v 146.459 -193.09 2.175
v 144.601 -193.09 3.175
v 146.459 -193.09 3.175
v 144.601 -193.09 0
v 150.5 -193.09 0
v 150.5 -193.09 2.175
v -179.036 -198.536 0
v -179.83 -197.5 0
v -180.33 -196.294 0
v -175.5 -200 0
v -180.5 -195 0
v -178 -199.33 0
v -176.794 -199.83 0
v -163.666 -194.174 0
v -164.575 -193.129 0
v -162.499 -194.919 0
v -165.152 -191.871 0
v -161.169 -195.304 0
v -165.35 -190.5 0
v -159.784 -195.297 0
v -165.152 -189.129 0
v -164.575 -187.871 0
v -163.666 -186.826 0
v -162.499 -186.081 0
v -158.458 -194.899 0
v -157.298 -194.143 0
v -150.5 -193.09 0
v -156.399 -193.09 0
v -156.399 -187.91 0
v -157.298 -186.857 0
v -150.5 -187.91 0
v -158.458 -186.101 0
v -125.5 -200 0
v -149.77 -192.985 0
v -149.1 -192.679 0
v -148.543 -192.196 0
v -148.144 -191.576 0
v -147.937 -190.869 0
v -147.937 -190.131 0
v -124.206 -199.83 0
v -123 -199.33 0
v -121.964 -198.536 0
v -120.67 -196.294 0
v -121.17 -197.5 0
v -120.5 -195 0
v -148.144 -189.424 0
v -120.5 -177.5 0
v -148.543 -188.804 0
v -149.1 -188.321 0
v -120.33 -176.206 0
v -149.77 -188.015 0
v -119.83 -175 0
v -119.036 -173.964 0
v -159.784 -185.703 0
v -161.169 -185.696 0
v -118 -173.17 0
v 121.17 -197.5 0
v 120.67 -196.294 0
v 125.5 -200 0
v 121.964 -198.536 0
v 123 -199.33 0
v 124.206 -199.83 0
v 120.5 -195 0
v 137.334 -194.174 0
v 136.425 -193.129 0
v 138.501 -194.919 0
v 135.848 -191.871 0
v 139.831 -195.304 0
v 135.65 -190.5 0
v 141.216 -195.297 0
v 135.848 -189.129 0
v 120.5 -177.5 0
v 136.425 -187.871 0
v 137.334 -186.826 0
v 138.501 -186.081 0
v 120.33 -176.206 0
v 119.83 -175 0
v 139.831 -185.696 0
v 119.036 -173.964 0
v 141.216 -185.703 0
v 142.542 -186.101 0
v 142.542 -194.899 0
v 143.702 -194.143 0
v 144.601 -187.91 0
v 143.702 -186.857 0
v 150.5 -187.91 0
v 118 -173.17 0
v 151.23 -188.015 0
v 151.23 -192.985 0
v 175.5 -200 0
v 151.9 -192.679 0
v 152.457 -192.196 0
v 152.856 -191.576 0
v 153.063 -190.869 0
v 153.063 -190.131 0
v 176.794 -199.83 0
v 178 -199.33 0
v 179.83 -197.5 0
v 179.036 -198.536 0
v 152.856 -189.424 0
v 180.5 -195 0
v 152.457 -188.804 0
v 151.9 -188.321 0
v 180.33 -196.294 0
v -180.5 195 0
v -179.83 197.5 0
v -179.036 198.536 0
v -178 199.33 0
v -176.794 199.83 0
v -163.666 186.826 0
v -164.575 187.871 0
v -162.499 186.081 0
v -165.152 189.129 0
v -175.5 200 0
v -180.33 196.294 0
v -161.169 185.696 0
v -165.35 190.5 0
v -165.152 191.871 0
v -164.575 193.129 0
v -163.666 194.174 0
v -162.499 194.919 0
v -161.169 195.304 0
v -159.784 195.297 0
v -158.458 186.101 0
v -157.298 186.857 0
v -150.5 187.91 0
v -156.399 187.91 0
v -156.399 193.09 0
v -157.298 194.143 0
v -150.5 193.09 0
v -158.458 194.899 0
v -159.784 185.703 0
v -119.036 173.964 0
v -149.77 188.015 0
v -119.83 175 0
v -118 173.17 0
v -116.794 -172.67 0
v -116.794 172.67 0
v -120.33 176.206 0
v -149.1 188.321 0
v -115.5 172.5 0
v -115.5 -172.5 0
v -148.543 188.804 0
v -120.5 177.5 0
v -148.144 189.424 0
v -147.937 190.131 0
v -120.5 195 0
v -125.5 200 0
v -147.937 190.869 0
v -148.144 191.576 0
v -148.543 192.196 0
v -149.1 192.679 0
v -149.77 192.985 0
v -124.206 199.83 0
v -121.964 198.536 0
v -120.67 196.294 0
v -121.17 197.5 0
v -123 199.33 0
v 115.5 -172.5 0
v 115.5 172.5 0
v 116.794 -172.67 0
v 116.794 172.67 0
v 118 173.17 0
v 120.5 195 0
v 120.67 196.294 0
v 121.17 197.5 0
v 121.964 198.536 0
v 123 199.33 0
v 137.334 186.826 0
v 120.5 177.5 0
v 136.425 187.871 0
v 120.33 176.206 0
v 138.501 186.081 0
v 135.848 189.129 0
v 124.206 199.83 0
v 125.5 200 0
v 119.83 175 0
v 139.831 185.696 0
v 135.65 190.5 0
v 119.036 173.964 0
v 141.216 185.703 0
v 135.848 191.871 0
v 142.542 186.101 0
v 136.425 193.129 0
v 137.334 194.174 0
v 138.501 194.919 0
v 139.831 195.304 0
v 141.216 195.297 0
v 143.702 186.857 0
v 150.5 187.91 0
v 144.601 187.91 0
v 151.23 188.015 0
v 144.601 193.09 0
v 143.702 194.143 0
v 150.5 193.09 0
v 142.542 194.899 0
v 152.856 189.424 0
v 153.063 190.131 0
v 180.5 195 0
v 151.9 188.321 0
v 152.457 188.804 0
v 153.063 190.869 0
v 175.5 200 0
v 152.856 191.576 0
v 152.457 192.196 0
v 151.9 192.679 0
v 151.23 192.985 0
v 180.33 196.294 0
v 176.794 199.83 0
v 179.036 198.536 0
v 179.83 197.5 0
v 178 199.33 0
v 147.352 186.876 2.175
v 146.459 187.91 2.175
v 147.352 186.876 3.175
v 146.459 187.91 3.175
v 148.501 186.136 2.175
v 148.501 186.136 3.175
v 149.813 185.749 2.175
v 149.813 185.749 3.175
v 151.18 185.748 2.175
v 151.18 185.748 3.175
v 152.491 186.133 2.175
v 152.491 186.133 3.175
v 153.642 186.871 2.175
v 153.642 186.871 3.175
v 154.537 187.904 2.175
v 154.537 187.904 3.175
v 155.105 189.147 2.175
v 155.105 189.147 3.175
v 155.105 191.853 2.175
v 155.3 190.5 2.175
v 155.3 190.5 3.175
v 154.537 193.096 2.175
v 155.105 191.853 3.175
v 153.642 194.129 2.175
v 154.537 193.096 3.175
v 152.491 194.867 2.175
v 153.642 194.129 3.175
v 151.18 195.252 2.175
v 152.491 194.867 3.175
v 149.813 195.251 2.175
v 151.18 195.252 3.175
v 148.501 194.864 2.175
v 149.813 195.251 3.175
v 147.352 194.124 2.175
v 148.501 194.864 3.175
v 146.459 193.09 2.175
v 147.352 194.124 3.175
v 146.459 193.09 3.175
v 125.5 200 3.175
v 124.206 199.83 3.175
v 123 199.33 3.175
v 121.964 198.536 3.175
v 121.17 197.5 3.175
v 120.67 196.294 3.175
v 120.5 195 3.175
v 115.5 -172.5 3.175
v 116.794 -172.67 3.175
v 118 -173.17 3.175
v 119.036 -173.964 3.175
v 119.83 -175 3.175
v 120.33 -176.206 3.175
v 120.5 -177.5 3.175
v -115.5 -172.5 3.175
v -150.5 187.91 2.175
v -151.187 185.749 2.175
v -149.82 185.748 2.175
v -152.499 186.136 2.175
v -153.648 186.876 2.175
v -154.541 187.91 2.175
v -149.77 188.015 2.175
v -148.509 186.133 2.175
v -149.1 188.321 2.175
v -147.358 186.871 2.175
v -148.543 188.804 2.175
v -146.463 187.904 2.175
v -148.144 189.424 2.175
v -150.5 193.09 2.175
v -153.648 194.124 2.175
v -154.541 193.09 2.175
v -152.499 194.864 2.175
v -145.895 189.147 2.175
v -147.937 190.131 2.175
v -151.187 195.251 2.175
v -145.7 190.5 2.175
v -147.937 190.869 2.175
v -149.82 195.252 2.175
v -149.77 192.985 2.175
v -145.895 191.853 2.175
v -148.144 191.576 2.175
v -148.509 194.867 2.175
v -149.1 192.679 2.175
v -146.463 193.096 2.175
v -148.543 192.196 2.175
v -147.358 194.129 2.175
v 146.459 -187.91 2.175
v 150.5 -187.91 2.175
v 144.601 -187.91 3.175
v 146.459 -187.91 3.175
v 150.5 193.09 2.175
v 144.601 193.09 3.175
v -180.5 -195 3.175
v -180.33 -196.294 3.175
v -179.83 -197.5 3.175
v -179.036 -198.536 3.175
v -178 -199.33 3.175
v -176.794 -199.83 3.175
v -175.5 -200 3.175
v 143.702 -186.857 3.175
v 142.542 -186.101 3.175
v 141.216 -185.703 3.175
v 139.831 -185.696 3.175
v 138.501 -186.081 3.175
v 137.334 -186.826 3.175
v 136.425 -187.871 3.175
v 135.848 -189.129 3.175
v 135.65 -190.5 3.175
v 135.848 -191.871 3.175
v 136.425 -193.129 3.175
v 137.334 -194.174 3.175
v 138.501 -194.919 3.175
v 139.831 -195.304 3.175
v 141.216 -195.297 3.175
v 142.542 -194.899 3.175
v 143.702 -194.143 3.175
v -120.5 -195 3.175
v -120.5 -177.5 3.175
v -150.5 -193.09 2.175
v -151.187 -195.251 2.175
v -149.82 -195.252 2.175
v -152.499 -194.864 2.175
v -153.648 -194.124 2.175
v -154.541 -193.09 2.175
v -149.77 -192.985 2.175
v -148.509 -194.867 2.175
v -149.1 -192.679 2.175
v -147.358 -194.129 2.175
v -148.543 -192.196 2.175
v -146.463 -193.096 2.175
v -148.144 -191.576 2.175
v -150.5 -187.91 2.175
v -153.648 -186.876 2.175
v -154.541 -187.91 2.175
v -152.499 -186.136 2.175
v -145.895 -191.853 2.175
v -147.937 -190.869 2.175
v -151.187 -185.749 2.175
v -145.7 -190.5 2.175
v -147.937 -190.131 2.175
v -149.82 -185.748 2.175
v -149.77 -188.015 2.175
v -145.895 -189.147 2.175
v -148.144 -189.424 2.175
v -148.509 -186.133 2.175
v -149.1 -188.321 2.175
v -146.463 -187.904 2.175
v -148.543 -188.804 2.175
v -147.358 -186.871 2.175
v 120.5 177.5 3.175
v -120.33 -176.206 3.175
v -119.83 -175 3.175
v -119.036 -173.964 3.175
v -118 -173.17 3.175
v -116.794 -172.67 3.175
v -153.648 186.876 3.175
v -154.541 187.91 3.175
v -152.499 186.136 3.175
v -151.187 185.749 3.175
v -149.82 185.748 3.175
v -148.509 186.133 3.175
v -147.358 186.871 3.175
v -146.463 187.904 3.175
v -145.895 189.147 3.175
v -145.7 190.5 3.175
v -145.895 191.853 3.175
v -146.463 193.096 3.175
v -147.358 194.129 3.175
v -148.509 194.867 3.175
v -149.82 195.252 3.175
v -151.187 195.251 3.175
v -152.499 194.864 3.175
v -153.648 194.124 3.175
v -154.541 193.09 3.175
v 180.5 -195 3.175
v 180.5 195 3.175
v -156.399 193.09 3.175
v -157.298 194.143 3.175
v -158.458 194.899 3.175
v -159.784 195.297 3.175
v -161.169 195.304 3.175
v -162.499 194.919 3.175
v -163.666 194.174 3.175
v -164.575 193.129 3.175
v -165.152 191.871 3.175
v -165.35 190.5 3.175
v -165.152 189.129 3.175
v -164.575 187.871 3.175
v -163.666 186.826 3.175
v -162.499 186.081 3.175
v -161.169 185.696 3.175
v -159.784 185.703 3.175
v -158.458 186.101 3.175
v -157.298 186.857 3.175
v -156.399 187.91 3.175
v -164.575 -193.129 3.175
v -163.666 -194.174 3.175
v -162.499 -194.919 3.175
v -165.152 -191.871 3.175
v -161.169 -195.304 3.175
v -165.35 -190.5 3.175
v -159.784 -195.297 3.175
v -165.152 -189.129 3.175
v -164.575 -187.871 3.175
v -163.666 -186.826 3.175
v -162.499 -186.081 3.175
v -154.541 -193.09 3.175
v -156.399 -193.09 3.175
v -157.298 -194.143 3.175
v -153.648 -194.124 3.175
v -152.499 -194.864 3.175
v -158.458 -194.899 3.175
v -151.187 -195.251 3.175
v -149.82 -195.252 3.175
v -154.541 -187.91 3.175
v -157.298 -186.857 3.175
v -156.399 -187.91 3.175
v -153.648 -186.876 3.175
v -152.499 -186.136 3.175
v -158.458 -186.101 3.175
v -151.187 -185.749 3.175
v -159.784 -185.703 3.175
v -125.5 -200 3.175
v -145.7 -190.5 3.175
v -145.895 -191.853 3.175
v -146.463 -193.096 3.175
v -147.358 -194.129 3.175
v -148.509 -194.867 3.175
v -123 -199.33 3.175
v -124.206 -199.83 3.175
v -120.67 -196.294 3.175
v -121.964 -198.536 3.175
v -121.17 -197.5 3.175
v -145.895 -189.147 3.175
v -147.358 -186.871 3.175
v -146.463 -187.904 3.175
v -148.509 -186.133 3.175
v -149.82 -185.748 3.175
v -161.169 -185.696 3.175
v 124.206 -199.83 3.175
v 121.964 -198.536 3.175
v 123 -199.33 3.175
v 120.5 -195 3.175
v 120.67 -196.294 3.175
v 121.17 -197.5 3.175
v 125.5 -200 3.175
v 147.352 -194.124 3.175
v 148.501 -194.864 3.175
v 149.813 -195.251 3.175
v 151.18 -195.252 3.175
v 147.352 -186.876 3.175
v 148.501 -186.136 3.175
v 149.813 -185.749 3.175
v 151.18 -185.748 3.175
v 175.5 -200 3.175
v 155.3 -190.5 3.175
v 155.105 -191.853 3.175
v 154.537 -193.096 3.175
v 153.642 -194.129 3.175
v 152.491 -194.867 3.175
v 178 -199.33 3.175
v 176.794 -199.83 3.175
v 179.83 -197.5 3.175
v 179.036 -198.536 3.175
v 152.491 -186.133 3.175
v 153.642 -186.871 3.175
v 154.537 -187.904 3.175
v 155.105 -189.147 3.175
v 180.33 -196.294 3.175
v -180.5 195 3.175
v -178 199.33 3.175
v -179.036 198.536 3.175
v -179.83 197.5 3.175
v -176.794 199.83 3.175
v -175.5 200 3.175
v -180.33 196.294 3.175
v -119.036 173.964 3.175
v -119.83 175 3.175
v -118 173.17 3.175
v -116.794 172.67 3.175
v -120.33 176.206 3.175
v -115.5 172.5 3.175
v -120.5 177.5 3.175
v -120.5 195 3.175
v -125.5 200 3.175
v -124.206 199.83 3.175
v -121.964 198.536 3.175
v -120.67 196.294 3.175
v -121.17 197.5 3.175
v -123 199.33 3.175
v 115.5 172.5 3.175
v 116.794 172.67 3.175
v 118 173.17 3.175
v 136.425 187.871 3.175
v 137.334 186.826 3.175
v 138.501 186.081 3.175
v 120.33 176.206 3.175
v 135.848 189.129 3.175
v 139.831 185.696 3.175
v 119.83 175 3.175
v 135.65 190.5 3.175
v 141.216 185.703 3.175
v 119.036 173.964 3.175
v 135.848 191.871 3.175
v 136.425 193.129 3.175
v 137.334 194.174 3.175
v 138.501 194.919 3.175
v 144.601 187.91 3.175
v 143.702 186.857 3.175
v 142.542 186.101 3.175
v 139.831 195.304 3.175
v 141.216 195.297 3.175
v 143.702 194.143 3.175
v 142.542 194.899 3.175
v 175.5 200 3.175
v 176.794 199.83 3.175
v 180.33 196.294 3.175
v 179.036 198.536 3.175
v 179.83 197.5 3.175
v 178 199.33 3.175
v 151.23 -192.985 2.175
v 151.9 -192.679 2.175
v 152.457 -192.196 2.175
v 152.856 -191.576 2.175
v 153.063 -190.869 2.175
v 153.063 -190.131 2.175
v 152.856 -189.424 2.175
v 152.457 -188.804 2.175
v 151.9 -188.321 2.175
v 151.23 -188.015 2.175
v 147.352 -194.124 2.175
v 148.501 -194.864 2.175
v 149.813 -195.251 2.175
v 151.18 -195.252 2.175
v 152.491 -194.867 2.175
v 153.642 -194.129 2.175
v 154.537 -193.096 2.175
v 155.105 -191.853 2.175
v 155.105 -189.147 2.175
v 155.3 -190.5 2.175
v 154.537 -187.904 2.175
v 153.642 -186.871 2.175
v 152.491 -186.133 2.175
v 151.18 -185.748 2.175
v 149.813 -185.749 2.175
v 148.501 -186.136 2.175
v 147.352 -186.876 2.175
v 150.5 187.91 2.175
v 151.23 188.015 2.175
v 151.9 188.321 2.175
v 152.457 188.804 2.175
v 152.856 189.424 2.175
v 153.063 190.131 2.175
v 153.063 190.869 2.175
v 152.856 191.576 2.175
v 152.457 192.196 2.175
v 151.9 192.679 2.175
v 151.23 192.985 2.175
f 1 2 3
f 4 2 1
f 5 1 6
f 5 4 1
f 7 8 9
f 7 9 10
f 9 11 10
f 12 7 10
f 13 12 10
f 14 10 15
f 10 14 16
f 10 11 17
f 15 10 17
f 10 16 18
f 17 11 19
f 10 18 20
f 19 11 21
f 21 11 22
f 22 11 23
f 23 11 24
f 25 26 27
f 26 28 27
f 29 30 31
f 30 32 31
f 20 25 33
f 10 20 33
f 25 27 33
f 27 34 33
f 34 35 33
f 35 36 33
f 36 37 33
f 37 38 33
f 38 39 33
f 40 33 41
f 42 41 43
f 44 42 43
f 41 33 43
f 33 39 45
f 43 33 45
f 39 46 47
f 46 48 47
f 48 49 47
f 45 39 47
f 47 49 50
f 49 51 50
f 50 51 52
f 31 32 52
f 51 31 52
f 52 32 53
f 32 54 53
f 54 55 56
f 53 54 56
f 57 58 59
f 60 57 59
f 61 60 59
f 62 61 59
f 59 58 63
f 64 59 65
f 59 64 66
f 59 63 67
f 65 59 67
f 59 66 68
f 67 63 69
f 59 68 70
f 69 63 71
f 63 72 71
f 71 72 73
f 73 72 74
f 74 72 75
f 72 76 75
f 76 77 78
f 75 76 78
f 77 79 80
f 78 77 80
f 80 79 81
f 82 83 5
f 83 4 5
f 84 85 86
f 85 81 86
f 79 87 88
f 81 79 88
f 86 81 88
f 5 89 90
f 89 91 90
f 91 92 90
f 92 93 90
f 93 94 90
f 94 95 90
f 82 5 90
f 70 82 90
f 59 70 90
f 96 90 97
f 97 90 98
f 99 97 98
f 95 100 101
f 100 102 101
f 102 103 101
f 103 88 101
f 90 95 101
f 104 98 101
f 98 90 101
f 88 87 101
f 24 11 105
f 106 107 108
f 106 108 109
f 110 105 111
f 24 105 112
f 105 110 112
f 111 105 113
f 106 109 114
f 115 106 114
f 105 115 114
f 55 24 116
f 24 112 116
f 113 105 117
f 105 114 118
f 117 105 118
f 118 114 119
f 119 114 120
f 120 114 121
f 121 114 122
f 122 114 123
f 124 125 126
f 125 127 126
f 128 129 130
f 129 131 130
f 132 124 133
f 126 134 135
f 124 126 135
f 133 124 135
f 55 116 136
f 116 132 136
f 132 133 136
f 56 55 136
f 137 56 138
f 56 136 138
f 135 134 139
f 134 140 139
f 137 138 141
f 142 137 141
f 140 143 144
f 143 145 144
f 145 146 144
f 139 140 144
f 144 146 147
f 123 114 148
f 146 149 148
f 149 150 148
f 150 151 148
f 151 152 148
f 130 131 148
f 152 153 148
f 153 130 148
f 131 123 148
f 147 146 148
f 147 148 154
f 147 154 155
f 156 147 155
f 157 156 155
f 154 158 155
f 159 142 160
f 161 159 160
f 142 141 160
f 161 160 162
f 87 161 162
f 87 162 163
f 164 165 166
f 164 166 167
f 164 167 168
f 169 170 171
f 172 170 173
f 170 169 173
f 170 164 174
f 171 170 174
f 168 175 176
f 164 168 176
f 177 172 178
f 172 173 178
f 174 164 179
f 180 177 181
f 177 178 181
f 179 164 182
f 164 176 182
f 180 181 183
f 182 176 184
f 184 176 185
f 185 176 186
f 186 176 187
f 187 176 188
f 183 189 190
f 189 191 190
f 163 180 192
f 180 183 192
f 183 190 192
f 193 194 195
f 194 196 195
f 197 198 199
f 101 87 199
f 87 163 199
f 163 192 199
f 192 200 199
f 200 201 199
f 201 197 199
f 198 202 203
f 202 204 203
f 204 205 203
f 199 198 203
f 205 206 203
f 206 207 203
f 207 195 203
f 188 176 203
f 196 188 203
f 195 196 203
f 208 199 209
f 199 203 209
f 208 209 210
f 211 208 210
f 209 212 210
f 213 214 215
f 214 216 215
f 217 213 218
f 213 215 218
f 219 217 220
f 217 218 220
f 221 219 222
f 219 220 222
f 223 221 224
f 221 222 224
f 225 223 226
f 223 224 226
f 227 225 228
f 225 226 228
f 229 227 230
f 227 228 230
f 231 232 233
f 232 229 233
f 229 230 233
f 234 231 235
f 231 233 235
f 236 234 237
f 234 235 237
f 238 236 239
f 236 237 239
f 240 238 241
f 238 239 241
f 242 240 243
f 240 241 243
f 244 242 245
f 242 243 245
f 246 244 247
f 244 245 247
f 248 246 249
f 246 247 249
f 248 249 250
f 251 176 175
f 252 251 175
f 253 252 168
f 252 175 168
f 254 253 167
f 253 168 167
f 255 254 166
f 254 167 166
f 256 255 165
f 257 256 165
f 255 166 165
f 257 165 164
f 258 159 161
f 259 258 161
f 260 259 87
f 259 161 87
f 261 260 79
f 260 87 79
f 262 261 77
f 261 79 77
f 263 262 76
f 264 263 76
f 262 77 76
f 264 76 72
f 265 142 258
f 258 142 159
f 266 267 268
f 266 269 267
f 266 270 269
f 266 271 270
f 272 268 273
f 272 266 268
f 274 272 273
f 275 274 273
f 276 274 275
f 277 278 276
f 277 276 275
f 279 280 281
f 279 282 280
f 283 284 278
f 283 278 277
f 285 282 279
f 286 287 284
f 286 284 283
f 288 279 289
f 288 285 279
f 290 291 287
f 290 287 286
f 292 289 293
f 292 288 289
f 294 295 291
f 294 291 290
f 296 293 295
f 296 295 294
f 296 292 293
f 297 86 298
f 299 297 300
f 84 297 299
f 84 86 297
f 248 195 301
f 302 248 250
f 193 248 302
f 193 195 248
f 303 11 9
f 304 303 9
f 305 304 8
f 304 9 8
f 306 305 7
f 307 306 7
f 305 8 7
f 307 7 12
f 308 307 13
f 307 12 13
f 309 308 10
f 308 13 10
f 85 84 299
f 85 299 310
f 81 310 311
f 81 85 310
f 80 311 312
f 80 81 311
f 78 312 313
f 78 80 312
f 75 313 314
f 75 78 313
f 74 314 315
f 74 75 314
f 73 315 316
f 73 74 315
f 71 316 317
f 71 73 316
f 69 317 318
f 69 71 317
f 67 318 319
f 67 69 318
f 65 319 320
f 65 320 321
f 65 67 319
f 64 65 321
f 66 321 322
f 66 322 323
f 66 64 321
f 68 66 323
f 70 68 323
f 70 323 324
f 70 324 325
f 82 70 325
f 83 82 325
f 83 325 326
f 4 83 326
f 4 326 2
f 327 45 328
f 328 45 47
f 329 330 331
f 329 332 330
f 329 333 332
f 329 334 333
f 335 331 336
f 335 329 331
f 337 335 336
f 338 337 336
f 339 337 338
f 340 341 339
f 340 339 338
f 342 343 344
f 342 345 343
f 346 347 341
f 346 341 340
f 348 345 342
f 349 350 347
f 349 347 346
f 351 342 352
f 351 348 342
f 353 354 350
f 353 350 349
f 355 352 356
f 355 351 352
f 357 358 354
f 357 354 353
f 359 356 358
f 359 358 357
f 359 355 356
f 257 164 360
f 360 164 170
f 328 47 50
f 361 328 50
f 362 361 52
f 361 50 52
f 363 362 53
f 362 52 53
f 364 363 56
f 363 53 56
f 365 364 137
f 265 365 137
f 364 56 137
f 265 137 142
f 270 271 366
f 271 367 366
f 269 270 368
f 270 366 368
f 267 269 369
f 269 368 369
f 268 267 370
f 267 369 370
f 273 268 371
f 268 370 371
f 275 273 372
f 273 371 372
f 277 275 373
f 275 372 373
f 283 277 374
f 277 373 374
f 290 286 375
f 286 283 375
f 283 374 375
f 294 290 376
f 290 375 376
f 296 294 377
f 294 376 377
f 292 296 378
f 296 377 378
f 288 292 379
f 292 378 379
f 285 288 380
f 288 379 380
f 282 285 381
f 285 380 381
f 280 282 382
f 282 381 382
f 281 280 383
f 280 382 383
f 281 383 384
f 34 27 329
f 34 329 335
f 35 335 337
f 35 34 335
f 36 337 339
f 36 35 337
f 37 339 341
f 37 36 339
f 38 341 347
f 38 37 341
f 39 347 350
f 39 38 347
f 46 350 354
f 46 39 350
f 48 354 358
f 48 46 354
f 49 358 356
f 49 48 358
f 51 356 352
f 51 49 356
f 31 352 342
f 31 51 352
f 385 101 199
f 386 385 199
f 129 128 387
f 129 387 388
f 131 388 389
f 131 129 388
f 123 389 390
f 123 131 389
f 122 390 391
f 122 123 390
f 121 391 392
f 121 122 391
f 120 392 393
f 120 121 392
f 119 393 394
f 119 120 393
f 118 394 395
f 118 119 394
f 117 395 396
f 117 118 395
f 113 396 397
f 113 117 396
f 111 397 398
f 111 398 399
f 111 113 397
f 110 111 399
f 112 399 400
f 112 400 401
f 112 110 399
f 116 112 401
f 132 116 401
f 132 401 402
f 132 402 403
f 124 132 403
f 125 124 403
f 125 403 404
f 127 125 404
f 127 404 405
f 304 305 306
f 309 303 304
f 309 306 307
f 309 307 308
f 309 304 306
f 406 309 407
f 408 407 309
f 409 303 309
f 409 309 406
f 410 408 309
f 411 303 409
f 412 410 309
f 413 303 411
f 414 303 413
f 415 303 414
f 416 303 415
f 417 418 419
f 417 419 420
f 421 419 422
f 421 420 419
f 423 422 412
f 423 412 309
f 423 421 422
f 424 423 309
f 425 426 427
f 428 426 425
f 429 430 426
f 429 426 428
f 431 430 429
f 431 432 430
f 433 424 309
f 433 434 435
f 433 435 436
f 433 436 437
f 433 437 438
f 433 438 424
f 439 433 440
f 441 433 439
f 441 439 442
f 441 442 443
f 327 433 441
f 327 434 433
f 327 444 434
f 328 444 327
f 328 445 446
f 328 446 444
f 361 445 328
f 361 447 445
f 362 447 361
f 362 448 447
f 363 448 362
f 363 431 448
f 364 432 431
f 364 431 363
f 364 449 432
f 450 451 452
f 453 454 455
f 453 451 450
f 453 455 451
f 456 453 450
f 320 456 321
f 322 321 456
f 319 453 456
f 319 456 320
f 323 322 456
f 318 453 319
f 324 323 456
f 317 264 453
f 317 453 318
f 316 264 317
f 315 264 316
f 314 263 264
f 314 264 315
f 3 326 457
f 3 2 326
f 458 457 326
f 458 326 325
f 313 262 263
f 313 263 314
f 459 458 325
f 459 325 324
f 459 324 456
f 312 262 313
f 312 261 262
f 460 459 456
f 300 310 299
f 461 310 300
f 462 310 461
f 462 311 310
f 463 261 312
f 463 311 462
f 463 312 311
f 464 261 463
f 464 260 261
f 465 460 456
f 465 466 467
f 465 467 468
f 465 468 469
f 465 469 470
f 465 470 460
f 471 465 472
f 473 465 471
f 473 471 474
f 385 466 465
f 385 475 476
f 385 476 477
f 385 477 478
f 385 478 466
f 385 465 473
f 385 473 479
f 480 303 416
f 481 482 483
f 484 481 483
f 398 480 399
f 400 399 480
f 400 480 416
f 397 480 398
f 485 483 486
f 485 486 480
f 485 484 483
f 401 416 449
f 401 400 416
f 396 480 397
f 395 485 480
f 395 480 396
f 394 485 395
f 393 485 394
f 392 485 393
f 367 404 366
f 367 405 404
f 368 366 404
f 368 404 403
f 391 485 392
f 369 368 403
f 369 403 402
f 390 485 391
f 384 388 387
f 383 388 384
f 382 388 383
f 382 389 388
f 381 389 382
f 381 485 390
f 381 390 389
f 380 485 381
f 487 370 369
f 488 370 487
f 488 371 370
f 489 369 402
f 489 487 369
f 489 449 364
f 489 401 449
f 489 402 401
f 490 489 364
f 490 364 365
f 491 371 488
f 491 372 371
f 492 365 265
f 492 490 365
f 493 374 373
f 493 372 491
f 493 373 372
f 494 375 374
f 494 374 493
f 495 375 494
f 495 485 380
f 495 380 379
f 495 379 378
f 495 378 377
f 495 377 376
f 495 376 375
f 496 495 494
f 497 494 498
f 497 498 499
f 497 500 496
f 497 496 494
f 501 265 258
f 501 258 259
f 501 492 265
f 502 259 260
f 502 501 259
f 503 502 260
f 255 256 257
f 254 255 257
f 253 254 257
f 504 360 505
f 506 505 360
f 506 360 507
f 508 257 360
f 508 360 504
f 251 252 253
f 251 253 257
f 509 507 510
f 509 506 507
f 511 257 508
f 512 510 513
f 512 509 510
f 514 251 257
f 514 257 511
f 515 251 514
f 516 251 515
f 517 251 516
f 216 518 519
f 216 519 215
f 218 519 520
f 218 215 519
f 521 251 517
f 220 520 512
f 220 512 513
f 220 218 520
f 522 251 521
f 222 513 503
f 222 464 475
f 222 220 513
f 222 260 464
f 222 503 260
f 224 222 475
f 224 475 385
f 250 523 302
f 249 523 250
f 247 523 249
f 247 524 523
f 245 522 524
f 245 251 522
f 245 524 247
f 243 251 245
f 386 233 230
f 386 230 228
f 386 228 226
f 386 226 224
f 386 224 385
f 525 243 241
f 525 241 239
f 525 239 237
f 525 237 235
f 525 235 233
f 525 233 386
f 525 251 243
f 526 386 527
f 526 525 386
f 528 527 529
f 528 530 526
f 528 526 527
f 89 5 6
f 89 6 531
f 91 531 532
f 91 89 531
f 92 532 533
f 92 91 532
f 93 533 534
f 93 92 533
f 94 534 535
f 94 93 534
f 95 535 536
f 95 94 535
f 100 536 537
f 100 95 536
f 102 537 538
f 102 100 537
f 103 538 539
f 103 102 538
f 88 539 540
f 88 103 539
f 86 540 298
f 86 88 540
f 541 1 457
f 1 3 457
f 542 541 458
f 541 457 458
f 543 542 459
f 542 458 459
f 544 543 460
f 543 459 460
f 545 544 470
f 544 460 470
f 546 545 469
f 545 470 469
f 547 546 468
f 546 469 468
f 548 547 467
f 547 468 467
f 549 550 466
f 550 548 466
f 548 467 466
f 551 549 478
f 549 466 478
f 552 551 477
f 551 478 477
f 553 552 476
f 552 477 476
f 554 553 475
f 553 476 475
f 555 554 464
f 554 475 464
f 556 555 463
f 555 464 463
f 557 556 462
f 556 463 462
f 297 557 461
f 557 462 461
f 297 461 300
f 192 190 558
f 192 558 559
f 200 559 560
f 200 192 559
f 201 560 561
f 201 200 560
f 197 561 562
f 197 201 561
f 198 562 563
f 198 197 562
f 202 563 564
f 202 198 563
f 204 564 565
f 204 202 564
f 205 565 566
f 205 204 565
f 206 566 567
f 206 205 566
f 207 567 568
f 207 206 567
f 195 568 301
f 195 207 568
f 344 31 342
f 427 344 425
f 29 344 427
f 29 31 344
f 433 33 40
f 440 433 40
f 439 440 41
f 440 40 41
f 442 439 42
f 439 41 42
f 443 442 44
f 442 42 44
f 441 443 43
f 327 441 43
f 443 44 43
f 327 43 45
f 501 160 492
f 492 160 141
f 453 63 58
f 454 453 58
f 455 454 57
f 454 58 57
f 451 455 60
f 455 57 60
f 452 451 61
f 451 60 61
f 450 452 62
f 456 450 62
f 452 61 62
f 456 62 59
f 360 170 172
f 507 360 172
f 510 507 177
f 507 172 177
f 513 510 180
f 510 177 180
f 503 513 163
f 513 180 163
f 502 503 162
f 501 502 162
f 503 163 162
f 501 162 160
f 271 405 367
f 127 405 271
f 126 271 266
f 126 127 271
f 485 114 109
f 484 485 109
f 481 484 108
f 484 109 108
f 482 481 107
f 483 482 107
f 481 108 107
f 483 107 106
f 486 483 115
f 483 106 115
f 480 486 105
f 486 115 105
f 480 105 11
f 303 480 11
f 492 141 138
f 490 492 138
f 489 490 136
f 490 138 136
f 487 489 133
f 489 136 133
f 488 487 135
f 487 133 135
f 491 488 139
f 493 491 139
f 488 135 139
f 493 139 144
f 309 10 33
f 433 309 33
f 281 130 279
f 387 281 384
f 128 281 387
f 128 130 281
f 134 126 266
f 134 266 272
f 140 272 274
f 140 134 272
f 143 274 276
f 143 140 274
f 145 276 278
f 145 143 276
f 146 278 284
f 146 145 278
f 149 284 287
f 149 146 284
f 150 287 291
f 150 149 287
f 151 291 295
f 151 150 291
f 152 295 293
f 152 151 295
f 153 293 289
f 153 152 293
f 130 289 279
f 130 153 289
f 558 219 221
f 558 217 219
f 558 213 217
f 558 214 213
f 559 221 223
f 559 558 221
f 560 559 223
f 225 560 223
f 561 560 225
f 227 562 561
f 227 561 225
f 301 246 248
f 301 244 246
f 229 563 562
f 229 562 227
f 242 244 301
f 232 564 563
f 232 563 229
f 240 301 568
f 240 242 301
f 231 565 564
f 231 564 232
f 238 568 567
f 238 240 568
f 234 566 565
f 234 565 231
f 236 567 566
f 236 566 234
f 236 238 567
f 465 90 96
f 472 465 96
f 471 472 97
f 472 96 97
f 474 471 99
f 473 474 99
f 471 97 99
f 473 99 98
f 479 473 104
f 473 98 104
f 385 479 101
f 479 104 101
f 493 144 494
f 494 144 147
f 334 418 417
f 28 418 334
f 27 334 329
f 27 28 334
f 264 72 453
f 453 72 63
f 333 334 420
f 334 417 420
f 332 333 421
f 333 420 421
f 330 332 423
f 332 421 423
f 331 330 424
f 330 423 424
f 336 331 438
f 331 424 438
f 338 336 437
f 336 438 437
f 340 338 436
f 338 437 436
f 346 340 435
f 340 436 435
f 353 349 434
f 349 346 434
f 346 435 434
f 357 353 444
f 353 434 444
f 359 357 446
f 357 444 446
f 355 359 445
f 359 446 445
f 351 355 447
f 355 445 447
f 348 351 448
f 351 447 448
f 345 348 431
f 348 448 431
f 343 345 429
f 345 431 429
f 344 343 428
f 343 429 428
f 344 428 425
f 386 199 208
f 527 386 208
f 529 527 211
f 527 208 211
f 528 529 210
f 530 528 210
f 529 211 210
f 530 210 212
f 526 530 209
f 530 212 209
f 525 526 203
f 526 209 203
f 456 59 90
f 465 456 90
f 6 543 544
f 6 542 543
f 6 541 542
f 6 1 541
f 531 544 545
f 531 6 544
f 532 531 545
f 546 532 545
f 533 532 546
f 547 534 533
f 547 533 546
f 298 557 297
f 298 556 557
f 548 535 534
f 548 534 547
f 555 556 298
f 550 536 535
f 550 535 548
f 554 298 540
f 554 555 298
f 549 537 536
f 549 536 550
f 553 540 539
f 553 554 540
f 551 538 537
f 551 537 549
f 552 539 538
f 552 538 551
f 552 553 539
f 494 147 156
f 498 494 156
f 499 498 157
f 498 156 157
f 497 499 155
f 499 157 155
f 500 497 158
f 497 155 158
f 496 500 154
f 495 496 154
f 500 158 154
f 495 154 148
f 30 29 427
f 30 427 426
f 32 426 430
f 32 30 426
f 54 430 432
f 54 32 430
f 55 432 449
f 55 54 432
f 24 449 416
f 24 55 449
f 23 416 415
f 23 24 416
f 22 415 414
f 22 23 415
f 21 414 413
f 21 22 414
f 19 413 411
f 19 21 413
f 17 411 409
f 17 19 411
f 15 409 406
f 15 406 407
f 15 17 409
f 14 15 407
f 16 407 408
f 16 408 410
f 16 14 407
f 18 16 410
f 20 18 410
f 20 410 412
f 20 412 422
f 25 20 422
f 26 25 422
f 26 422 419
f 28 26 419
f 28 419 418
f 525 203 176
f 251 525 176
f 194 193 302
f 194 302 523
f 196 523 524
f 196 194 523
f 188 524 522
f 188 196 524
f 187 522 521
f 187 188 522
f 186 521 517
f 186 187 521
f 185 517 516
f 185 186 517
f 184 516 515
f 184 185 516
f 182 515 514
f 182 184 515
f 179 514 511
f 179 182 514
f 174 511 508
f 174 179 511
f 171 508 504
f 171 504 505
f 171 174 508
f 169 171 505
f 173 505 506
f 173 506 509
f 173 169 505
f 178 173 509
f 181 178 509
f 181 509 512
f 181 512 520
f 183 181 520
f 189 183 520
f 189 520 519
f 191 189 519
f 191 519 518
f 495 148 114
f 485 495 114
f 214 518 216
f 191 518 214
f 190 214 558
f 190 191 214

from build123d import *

# Parameters (mm, degrees)
BOSS_EXTRUDE1_DEPTH = 3.175
SKETCH2_R           = 4.8
CUT_EXTRUDE1_DEPTH  = 1


with BuildPart() as part:
    # Model → Boss-Extrude1 (new body)
    with BuildSketch(Plane.XY):
        with BuildLine():
            Line((175.500000042, 200), (125.500000042, 200))
            ThreePointArc((125.500000042, 200), (121.964466136, 198.535533906), (120.500000042, 195))
            Line((120.500000042, 195), (120.500000042, 177.5))
            ThreePointArc((120.500000042, 177.5), (119.035533948, 173.964466094), (115.500000042, 172.5))
            Line((115.500000042, 172.5), (-115.500000042, 172.5))
            ThreePointArc((-115.500000042, 172.5), (-119.035533948, 173.964466094), (-120.500000042, 177.5))
            Line((-120.500000042, 177.5), (-120.500000042, 195))
            ThreePointArc((-120.500000042, 195), (-121.964466136, 198.535533906), (-125.500000042, 200))
            Line((-125.500000042, 200), (-175.500000042, 200))
            ThreePointArc((-175.500000042, 200), (-179.035533948, 198.535533906), (-180.500000042, 195))
            Line((-180.500000042, 195), (-180.500000042, -195))
            ThreePointArc((-180.500000042, -195), (-179.035533948, -198.535533906), (-175.500000042, -200))
            Line((-175.500000042, -200), (-125.500000042, -200))
            ThreePointArc((-125.500000042, -200), (-121.964466136, -198.535533906), (-120.500000042, -195))
            Line((-120.500000042, -195), (-120.500000042, -177.5))
            ThreePointArc((-120.500000042, -177.5), (-119.035533948, -173.964466094), (-115.500000042, -172.5))
            Line((-115.500000042, -172.5), (115.500000042, -172.5))
            ThreePointArc((115.500000042, -172.5), (119.035533948, -173.964466094), (120.500000042, -177.5))
            Line((120.500000042, -177.5), (120.500000042, -195))
            ThreePointArc((120.500000042, -195), (121.964466136, -198.535533906), (125.500000042, -200))
            Line((125.500000042, -200), (175.500000042, -200))
            ThreePointArc((175.500000042, -200), (179.035533948, -198.535533906), (180.500000042, -195))
            Line((180.500000042, -195), (180.500000042, 195))
            ThreePointArc((180.500000042, 195), (179.035533948, 198.535533906), (175.500000042, 200))
        make_face()
        with BuildLine():
            Line((144.600753463, 187.910343452), (150.5, 187.910343452))
            ThreePointArc((150.5, 187.910343452), (153.089656548, 190.5), (150.5, 193.089656548))
            Line((150.5, 193.089656548), (144.600753463, 193.089656548))
            ThreePointArc((144.600753463, 193.089656548), (135.65, 190.5), (144.600753463, 187.910343452))
        make_face(mode=Mode.SUBTRACT)
        with BuildLine():
            Line((150.5, -187.910343452), (144.600753463, -187.910343452))
            ThreePointArc((144.600753463, -187.910343452), (135.65, -190.5), (144.600753463, -193.089656548))
            Line((144.600753463, -193.089656548), (150.5, -193.089656548))
            ThreePointArc((150.5, -193.089656548), (153.089656548, -190.5), (150.5, -187.910343452))
        make_face(mode=Mode.SUBTRACT)
        with BuildLine():
            Line((-150.5, -187.910343452), (-156.399246537, -187.910343452))
            ThreePointArc((-156.399246537, -187.910343452), (-165.35, -190.5), (-156.399246537, -193.089656548))
            Line((-156.399246537, -193.089656548), (-150.5, -193.089656548))
            ThreePointArc((-150.5, -193.089656548), (-147.910343452, -190.5), (-150.5, -187.910343452))
        make_face(mode=Mode.SUBTRACT)
        with BuildLine():
            Line((-150.5, 193.089656548), (-156.399246537, 193.089656548))
            ThreePointArc((-156.399246537, 193.089656548), (-165.35, 190.5), (-156.399246537, 187.910343452))
            Line((-156.399246537, 187.910343452), (-150.5, 187.910343452))
            ThreePointArc((-150.5, 187.910343452), (-147.910343452, 190.5), (-150.5, 193.089656548))
        make_face(mode=Mode.SUBTRACT)
    extrude(amount=BOSS_EXTRUDE1_DEPTH)

    # Sketch2 → Cut-Extrude1 (cut)
    with BuildSketch(Plane.XY.offset(3.175)):
        with Locations((-150.5, 190.5)):
            Circle(SKETCH2_R)
        with Locations((150.5, 190.5)):
            Circle(SKETCH2_R)
        with Locations((150.5, -190.5)):
            Circle(SKETCH2_R)
        with Locations((-150.5, -190.5)):
            Circle(SKETCH2_R)
    extrude(amount=-CUT_EXTRUDE1_DEPTH, mode=Mode.SUBTRACT)


solid = part.part
